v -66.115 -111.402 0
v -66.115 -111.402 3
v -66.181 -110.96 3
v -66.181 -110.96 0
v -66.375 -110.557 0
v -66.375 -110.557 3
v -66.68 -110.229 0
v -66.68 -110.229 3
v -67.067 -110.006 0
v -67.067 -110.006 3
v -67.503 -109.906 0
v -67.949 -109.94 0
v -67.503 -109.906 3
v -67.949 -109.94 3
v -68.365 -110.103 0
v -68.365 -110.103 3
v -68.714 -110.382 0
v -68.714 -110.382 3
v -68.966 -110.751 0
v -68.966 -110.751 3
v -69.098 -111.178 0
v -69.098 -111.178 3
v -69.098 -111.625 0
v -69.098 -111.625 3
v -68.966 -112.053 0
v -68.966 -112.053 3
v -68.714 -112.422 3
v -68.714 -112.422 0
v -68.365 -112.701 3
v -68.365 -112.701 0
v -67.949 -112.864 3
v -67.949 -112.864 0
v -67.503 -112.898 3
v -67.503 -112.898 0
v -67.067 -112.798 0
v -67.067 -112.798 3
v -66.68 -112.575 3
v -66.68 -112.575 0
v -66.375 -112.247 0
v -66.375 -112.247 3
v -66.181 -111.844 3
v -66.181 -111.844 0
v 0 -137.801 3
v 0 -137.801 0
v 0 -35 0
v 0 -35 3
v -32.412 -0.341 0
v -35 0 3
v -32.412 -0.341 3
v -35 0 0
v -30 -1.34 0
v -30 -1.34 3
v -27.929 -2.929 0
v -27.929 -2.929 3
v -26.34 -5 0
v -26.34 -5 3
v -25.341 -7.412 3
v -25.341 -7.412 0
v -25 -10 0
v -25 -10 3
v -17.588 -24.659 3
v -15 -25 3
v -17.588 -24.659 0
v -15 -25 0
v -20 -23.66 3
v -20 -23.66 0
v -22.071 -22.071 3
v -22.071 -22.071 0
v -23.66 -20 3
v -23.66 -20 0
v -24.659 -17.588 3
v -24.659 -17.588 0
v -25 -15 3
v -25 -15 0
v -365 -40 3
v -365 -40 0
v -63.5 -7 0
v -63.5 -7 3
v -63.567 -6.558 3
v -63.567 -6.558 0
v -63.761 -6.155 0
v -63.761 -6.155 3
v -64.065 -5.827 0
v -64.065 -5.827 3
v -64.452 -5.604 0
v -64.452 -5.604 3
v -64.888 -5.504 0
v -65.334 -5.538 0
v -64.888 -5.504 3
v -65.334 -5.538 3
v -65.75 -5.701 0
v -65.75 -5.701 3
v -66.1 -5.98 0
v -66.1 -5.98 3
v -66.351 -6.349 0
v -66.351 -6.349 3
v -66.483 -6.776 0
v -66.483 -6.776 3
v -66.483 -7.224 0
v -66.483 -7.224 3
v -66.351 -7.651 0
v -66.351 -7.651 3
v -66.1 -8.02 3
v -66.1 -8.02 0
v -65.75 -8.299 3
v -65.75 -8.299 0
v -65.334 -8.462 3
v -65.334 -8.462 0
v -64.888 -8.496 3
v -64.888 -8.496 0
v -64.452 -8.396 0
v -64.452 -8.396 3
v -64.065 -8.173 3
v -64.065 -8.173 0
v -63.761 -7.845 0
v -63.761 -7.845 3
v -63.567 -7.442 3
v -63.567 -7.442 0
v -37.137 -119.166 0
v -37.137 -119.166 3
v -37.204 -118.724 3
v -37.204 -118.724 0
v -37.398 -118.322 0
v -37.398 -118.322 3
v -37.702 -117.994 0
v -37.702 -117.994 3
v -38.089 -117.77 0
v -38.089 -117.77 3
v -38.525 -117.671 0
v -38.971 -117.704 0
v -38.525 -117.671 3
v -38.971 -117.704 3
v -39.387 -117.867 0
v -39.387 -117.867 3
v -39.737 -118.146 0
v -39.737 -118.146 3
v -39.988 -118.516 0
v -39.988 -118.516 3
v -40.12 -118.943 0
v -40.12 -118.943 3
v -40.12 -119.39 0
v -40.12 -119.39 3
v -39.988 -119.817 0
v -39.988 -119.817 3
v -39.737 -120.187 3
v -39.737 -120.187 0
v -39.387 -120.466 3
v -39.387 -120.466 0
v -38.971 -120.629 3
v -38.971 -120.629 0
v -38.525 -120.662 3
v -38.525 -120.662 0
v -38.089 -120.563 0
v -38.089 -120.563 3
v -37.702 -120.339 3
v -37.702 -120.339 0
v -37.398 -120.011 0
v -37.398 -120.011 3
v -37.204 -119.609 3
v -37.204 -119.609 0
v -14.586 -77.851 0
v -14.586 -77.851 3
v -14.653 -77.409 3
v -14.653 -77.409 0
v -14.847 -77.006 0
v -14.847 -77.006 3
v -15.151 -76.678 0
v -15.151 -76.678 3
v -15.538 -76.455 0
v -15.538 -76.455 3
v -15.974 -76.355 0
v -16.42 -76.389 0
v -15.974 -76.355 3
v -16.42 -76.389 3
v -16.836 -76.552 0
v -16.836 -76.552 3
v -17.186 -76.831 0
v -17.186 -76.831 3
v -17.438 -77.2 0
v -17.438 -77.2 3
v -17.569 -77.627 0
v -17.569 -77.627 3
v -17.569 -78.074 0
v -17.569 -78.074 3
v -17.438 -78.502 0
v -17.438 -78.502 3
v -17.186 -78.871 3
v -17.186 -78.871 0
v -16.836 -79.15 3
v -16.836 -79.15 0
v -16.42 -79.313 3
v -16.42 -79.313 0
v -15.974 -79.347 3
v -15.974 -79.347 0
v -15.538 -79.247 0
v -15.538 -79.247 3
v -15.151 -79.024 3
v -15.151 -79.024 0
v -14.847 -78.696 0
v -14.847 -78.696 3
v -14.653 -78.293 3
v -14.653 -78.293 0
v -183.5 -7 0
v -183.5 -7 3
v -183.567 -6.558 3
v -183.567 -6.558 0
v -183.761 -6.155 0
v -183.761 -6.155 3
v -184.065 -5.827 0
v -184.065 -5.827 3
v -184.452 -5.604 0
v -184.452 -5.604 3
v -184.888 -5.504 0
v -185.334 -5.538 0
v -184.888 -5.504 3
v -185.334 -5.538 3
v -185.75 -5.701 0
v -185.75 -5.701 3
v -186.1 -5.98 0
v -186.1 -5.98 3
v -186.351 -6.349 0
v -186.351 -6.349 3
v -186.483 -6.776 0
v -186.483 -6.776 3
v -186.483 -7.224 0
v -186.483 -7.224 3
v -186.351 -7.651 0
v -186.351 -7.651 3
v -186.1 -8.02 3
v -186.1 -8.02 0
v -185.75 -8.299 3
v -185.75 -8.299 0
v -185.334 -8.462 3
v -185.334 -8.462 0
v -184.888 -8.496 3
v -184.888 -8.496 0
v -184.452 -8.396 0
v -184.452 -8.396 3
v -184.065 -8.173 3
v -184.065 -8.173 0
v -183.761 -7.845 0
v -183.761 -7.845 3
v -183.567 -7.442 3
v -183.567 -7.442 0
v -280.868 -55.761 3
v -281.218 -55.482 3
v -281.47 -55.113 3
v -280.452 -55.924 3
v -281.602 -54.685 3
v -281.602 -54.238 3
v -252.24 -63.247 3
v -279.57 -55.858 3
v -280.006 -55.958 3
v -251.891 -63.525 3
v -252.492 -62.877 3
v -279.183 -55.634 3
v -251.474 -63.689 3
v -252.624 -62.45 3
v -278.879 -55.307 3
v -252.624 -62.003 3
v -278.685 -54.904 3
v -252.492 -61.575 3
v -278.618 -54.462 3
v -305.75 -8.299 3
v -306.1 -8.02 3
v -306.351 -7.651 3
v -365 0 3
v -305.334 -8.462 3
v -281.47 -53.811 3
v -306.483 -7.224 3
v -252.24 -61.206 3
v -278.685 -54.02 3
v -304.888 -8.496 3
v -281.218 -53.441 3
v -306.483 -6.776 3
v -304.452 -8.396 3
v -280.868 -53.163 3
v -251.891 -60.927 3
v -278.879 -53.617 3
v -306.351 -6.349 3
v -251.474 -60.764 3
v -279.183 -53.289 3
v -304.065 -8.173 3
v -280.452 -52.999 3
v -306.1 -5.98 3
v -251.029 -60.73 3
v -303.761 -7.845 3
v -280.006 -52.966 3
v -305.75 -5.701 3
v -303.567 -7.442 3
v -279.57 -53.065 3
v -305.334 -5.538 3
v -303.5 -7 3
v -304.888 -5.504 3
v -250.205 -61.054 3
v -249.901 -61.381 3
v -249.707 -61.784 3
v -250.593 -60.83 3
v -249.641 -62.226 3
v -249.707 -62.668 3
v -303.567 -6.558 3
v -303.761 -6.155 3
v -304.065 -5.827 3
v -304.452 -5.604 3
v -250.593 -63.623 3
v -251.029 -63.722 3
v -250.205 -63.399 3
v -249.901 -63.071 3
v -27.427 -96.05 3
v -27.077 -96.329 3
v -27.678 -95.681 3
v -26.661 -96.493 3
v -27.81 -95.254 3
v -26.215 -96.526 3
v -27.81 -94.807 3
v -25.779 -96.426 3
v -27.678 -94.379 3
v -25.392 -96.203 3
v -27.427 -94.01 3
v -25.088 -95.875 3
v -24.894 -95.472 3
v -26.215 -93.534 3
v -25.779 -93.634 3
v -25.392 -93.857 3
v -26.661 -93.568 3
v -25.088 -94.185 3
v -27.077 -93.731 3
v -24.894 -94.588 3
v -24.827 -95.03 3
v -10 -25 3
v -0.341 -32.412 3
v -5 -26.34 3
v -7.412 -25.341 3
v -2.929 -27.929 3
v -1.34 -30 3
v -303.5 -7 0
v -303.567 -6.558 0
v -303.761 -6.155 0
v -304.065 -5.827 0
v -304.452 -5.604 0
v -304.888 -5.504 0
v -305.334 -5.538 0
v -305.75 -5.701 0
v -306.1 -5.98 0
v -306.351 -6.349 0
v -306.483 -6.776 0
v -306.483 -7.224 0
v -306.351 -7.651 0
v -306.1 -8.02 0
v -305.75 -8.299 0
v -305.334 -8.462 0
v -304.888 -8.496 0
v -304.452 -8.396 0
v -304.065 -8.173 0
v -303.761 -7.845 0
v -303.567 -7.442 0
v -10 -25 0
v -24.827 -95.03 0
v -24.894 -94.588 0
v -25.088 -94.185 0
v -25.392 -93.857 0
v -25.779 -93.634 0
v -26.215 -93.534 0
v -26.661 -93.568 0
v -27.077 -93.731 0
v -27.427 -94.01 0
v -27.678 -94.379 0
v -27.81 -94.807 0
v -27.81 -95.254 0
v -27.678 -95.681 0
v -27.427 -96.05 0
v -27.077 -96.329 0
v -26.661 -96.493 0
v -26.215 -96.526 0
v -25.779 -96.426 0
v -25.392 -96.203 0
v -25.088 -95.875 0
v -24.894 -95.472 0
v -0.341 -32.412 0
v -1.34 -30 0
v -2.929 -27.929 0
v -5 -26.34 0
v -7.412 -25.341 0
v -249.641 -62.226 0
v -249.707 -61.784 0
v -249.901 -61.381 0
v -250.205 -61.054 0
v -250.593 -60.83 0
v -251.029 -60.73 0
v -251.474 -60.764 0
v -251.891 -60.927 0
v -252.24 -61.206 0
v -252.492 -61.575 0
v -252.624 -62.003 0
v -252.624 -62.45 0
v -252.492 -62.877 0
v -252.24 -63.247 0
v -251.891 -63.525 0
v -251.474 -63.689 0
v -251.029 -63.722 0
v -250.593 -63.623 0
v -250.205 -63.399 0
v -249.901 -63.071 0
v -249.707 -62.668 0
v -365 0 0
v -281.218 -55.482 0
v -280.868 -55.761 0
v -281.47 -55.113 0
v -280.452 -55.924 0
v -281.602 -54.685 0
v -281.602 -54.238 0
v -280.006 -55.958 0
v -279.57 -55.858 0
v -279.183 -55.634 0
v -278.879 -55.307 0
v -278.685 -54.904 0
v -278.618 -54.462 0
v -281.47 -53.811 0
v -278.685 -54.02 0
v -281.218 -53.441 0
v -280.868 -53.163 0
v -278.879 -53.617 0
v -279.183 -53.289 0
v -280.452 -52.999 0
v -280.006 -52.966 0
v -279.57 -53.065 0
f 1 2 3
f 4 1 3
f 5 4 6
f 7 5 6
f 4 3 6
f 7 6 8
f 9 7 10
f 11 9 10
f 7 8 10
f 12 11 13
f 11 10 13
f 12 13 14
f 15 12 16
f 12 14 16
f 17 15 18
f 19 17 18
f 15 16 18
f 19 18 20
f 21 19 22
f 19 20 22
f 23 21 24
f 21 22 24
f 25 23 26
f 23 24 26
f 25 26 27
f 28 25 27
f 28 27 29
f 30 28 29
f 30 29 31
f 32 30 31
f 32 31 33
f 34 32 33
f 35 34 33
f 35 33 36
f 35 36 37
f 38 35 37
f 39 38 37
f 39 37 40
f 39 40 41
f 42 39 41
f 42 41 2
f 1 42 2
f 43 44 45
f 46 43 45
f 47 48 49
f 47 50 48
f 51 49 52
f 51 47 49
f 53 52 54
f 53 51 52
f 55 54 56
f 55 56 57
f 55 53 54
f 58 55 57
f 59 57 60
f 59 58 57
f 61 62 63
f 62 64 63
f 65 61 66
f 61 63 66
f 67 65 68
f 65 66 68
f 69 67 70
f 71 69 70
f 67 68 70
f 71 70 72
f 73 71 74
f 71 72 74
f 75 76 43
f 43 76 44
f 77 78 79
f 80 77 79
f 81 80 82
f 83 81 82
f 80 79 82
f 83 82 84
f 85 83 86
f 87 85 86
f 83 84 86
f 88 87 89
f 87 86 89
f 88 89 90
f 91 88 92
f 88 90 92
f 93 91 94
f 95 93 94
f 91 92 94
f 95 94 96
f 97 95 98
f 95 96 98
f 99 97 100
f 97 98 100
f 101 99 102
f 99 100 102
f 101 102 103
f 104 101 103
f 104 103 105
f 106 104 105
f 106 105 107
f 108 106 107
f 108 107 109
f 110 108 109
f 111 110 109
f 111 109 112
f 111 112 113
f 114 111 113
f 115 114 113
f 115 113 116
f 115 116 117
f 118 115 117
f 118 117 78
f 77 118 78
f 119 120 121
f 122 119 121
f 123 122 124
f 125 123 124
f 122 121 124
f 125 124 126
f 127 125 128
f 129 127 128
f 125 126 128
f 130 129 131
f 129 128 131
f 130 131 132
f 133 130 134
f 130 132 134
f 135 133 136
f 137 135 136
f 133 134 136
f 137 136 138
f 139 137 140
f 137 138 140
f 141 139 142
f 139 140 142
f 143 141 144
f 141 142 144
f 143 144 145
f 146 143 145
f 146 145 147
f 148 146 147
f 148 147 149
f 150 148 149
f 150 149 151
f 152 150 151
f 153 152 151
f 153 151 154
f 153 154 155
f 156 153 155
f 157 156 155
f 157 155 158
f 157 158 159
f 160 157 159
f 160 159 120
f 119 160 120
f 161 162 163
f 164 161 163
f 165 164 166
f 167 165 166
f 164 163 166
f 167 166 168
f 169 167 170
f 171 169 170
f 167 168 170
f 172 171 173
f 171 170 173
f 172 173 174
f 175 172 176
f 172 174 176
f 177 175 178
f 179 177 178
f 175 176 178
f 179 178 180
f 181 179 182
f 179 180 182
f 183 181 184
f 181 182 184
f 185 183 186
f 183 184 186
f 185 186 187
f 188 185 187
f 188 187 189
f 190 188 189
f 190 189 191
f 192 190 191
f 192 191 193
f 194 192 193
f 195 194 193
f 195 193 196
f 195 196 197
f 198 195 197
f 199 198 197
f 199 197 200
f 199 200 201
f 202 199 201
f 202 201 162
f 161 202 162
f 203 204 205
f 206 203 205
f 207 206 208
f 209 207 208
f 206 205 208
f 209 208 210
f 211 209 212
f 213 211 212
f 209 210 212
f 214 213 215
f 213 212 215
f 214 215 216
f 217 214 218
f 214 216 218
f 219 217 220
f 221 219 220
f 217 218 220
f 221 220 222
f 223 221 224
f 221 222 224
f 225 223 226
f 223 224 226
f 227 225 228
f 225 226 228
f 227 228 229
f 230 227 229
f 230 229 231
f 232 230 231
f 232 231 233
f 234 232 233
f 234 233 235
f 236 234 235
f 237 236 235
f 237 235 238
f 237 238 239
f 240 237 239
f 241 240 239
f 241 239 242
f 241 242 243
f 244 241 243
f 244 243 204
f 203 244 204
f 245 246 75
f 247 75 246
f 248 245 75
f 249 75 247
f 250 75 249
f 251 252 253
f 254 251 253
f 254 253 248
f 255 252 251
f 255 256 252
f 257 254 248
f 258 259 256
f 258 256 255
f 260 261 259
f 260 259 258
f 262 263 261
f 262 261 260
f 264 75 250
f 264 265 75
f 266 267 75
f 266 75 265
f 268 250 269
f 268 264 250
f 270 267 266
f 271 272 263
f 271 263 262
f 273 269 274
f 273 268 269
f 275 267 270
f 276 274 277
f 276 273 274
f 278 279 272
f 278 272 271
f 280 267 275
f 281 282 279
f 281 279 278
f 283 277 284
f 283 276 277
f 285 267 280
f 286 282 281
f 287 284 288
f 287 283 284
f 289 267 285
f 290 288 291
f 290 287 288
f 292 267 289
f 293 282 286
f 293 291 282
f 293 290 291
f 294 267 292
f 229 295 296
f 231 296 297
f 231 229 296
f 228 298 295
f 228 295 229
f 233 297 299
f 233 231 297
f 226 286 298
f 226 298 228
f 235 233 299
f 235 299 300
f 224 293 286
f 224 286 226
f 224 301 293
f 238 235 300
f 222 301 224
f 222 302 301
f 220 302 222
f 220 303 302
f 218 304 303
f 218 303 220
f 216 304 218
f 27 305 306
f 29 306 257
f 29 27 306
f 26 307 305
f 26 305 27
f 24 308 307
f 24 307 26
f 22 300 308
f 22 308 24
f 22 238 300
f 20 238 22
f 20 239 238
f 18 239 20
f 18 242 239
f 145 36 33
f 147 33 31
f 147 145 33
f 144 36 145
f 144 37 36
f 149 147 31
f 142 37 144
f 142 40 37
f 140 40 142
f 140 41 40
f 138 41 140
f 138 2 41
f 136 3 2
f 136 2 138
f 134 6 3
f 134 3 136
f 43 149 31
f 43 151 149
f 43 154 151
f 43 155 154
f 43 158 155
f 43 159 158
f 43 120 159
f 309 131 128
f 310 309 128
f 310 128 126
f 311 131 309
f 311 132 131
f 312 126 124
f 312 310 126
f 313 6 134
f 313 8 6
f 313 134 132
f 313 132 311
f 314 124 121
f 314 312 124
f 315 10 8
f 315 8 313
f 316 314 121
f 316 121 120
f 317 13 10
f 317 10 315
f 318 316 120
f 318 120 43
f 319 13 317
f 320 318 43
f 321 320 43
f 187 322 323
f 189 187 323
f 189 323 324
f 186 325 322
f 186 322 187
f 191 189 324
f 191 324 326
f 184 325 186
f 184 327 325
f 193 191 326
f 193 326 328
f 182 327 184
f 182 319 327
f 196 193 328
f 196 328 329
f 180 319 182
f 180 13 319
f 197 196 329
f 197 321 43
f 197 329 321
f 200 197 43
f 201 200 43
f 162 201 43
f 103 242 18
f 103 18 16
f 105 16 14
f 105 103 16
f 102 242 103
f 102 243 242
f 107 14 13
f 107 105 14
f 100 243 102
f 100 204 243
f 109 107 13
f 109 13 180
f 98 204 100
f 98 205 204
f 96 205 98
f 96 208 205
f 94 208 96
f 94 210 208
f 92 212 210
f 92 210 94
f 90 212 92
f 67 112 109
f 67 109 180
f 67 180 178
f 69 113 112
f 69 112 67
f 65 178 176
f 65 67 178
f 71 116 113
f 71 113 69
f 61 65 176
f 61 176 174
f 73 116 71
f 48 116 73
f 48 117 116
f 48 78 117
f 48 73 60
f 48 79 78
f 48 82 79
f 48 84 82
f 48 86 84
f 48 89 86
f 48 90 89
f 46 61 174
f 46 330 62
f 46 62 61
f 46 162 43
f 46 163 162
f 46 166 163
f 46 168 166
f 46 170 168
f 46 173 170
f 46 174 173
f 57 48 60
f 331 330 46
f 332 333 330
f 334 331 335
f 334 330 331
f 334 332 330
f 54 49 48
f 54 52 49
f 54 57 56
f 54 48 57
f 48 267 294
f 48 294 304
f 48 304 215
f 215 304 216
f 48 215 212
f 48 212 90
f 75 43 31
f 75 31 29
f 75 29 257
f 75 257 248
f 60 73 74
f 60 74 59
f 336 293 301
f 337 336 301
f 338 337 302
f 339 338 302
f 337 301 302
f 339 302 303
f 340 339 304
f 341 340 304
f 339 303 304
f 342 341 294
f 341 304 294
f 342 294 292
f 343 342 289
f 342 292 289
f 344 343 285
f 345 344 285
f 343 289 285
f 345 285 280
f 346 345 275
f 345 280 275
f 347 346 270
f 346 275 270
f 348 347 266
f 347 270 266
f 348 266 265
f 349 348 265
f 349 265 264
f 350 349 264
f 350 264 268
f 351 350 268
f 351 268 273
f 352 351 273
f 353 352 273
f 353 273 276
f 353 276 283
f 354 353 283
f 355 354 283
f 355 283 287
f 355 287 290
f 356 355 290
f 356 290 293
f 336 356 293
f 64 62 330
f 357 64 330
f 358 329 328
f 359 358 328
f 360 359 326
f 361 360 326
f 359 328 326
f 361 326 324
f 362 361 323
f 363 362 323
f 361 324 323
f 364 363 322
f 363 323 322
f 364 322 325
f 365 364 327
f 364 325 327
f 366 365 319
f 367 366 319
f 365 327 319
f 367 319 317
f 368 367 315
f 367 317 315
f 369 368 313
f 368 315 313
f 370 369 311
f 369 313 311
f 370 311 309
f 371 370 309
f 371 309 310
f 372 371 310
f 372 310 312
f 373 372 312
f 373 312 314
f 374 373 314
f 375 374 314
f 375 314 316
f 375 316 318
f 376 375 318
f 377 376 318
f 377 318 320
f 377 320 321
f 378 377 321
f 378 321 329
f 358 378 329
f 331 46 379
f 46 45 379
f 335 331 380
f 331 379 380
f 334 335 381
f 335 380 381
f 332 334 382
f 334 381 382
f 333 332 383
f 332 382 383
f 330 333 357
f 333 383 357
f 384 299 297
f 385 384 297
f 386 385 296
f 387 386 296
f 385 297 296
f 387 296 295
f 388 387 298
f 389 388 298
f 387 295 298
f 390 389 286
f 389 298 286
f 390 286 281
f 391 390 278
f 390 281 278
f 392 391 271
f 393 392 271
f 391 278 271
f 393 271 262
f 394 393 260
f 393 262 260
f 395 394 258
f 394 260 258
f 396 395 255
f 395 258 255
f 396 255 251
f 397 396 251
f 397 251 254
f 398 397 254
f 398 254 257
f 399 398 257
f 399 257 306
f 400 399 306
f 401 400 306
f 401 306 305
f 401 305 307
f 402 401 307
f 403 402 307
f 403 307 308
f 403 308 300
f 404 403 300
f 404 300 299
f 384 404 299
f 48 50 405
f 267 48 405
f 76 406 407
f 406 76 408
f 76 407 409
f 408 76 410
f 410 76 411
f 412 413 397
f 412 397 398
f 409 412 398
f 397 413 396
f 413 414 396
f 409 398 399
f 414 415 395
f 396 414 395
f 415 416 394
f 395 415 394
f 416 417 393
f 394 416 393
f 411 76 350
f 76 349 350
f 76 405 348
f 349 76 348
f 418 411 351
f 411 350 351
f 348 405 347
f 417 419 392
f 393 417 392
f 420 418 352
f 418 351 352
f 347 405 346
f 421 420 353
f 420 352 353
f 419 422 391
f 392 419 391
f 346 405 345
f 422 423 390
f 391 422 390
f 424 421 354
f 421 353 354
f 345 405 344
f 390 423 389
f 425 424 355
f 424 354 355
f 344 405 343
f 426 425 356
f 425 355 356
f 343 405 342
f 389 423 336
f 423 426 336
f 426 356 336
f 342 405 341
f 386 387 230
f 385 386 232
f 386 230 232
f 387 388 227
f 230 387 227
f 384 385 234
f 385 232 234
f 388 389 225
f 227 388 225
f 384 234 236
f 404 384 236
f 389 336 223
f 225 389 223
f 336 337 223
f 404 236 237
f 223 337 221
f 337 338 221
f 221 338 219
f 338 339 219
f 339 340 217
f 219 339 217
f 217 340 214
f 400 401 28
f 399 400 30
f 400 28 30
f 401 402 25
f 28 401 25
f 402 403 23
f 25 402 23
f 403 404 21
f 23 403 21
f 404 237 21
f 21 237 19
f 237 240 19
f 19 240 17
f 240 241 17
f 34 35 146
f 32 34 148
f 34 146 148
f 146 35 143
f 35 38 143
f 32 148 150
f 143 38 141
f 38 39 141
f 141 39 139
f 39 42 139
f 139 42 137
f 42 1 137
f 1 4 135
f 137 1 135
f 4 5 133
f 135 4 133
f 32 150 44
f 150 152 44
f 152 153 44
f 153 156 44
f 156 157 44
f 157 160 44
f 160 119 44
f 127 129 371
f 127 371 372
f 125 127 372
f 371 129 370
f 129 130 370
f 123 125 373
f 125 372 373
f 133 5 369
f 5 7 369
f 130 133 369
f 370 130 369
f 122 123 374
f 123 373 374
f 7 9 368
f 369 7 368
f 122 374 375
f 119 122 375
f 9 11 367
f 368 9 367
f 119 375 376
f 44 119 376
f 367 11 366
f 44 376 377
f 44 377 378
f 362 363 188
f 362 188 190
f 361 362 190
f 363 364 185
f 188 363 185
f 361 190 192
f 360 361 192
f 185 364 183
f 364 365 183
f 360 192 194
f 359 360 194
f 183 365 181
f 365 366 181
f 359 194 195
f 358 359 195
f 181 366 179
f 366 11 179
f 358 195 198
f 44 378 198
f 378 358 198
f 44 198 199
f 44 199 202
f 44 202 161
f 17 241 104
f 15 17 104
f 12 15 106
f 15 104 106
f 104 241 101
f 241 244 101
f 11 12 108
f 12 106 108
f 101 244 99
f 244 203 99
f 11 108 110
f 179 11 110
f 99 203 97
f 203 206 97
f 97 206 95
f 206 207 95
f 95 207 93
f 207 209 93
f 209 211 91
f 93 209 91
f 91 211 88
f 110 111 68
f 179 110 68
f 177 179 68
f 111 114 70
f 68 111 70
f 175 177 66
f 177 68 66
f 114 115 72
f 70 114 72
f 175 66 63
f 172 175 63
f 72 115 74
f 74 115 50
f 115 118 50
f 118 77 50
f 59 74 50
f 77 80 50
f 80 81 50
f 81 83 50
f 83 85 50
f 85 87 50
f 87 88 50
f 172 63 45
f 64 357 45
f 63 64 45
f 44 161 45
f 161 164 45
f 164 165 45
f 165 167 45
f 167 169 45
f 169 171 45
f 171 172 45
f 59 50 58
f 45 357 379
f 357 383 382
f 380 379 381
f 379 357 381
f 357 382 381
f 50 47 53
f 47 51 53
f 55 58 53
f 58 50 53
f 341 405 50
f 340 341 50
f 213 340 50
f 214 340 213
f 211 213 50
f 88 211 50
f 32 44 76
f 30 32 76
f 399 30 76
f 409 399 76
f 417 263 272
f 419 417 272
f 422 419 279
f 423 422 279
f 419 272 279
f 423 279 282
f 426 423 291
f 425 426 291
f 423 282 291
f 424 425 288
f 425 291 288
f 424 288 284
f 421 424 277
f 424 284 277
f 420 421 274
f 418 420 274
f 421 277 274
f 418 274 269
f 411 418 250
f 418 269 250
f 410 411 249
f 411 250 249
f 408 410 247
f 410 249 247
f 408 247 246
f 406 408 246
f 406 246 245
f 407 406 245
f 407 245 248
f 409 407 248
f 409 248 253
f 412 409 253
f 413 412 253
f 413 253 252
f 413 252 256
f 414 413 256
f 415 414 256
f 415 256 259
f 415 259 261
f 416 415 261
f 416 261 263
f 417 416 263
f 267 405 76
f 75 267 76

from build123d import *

# Parameters (mm, degrees)
EXTRUDE_1_DEPTH     = 3
SKETCH_3_W          = 25
SKETCH_3_H          = 25
CUT_EXTRUDE_1_DEPTH = 391.157969373
SKETCH_5_R          = 1.5
CUT_EXTRUDE_3_DEPTH = 391.157969373
FILLET_2_R          = 10
SKETCH_6_R          = 1.5
CUT_EXTRUDE_6_DEPTH = 10
SKETCH_7_R          = 1.5
CUT_EXTRUDE_7_DEPTH = 391.157969373


with BuildPart() as part:
    # 草图1 → 凸台-拉伸1 (new body)
    with BuildSketch(Plane.XY):
        Polygon((0, -137.801455237), (0, 0), (-365, 0), (-365, -40), align=None)
    extrude(amount=EXTRUDE_1_DEPTH)

    # 草图3 → 切除-拉伸1 (cut, through all)
    with BuildSketch(Plane.XY.offset(3)):
        with Locations((-12.5, -12.5)):
            Rectangle(SKETCH_3_W, SKETCH_3_H)
    extrude(amount=-CUT_EXTRUDE_1_DEPTH, mode=Mode.SUBTRACT)

    # 草图5 → 切除-拉伸3 (cut, through all)
    with BuildSketch(Plane.XY.offset(3)):
        with Locations((-305, -7)):
            Circle(SKETCH_5_R)
        with Locations((-185, -7)):
            Circle(SKETCH_5_R)
        with Locations((-65, -7)):
            Circle(SKETCH_5_R)
    extrude(amount=-CUT_EXTRUDE_3_DEPTH, mode=Mode.SUBTRACT)

    # 圆角2
    fillet_2_edges = [part.edges().sort_by_distance(p)[0] for p in [
        (0, -25, 1.5),
        (-25, -25, 1.5),
        (-25, 0, 1.5),
    ]]
    fillet(fillet_2_edges, radius=FILLET_2_R)

    # 草图6 → 切除-拉伸6 (cut)
    with BuildSketch(Plane.XY.offset(3)):
        with Locations((-38.637033052, -119.16648399)):
            Circle(SKETCH_6_R)
        with Locations((-67.61480784, -111.401912637)):
            Circle(SKETCH_6_R)
        with Locations((-251.140714835, -62.226294067)):
            Circle(SKETCH_6_R)
        with Locations((-280.118489624, -54.461722714)):
            Circle(SKETCH_6_R)
    extrude(amount=-CUT_EXTRUDE_6_DEPTH, mode=Mode.SUBTRACT)

    # 草图7 → 切除-拉伸7 (cut, through all)
    with BuildSketch(Plane.XY.offset(3)):
        with Locations((-26.327035604, -95.030119084)):
            Circle(SKETCH_7_R)
        with Locations((-16.086178306, -77.850921146)):
            Circle(SKETCH_7_R)
    extrude(amount=-CUT_EXTRUDE_7_DEPTH, mode=Mode.SUBTRACT)


solid = part.part
